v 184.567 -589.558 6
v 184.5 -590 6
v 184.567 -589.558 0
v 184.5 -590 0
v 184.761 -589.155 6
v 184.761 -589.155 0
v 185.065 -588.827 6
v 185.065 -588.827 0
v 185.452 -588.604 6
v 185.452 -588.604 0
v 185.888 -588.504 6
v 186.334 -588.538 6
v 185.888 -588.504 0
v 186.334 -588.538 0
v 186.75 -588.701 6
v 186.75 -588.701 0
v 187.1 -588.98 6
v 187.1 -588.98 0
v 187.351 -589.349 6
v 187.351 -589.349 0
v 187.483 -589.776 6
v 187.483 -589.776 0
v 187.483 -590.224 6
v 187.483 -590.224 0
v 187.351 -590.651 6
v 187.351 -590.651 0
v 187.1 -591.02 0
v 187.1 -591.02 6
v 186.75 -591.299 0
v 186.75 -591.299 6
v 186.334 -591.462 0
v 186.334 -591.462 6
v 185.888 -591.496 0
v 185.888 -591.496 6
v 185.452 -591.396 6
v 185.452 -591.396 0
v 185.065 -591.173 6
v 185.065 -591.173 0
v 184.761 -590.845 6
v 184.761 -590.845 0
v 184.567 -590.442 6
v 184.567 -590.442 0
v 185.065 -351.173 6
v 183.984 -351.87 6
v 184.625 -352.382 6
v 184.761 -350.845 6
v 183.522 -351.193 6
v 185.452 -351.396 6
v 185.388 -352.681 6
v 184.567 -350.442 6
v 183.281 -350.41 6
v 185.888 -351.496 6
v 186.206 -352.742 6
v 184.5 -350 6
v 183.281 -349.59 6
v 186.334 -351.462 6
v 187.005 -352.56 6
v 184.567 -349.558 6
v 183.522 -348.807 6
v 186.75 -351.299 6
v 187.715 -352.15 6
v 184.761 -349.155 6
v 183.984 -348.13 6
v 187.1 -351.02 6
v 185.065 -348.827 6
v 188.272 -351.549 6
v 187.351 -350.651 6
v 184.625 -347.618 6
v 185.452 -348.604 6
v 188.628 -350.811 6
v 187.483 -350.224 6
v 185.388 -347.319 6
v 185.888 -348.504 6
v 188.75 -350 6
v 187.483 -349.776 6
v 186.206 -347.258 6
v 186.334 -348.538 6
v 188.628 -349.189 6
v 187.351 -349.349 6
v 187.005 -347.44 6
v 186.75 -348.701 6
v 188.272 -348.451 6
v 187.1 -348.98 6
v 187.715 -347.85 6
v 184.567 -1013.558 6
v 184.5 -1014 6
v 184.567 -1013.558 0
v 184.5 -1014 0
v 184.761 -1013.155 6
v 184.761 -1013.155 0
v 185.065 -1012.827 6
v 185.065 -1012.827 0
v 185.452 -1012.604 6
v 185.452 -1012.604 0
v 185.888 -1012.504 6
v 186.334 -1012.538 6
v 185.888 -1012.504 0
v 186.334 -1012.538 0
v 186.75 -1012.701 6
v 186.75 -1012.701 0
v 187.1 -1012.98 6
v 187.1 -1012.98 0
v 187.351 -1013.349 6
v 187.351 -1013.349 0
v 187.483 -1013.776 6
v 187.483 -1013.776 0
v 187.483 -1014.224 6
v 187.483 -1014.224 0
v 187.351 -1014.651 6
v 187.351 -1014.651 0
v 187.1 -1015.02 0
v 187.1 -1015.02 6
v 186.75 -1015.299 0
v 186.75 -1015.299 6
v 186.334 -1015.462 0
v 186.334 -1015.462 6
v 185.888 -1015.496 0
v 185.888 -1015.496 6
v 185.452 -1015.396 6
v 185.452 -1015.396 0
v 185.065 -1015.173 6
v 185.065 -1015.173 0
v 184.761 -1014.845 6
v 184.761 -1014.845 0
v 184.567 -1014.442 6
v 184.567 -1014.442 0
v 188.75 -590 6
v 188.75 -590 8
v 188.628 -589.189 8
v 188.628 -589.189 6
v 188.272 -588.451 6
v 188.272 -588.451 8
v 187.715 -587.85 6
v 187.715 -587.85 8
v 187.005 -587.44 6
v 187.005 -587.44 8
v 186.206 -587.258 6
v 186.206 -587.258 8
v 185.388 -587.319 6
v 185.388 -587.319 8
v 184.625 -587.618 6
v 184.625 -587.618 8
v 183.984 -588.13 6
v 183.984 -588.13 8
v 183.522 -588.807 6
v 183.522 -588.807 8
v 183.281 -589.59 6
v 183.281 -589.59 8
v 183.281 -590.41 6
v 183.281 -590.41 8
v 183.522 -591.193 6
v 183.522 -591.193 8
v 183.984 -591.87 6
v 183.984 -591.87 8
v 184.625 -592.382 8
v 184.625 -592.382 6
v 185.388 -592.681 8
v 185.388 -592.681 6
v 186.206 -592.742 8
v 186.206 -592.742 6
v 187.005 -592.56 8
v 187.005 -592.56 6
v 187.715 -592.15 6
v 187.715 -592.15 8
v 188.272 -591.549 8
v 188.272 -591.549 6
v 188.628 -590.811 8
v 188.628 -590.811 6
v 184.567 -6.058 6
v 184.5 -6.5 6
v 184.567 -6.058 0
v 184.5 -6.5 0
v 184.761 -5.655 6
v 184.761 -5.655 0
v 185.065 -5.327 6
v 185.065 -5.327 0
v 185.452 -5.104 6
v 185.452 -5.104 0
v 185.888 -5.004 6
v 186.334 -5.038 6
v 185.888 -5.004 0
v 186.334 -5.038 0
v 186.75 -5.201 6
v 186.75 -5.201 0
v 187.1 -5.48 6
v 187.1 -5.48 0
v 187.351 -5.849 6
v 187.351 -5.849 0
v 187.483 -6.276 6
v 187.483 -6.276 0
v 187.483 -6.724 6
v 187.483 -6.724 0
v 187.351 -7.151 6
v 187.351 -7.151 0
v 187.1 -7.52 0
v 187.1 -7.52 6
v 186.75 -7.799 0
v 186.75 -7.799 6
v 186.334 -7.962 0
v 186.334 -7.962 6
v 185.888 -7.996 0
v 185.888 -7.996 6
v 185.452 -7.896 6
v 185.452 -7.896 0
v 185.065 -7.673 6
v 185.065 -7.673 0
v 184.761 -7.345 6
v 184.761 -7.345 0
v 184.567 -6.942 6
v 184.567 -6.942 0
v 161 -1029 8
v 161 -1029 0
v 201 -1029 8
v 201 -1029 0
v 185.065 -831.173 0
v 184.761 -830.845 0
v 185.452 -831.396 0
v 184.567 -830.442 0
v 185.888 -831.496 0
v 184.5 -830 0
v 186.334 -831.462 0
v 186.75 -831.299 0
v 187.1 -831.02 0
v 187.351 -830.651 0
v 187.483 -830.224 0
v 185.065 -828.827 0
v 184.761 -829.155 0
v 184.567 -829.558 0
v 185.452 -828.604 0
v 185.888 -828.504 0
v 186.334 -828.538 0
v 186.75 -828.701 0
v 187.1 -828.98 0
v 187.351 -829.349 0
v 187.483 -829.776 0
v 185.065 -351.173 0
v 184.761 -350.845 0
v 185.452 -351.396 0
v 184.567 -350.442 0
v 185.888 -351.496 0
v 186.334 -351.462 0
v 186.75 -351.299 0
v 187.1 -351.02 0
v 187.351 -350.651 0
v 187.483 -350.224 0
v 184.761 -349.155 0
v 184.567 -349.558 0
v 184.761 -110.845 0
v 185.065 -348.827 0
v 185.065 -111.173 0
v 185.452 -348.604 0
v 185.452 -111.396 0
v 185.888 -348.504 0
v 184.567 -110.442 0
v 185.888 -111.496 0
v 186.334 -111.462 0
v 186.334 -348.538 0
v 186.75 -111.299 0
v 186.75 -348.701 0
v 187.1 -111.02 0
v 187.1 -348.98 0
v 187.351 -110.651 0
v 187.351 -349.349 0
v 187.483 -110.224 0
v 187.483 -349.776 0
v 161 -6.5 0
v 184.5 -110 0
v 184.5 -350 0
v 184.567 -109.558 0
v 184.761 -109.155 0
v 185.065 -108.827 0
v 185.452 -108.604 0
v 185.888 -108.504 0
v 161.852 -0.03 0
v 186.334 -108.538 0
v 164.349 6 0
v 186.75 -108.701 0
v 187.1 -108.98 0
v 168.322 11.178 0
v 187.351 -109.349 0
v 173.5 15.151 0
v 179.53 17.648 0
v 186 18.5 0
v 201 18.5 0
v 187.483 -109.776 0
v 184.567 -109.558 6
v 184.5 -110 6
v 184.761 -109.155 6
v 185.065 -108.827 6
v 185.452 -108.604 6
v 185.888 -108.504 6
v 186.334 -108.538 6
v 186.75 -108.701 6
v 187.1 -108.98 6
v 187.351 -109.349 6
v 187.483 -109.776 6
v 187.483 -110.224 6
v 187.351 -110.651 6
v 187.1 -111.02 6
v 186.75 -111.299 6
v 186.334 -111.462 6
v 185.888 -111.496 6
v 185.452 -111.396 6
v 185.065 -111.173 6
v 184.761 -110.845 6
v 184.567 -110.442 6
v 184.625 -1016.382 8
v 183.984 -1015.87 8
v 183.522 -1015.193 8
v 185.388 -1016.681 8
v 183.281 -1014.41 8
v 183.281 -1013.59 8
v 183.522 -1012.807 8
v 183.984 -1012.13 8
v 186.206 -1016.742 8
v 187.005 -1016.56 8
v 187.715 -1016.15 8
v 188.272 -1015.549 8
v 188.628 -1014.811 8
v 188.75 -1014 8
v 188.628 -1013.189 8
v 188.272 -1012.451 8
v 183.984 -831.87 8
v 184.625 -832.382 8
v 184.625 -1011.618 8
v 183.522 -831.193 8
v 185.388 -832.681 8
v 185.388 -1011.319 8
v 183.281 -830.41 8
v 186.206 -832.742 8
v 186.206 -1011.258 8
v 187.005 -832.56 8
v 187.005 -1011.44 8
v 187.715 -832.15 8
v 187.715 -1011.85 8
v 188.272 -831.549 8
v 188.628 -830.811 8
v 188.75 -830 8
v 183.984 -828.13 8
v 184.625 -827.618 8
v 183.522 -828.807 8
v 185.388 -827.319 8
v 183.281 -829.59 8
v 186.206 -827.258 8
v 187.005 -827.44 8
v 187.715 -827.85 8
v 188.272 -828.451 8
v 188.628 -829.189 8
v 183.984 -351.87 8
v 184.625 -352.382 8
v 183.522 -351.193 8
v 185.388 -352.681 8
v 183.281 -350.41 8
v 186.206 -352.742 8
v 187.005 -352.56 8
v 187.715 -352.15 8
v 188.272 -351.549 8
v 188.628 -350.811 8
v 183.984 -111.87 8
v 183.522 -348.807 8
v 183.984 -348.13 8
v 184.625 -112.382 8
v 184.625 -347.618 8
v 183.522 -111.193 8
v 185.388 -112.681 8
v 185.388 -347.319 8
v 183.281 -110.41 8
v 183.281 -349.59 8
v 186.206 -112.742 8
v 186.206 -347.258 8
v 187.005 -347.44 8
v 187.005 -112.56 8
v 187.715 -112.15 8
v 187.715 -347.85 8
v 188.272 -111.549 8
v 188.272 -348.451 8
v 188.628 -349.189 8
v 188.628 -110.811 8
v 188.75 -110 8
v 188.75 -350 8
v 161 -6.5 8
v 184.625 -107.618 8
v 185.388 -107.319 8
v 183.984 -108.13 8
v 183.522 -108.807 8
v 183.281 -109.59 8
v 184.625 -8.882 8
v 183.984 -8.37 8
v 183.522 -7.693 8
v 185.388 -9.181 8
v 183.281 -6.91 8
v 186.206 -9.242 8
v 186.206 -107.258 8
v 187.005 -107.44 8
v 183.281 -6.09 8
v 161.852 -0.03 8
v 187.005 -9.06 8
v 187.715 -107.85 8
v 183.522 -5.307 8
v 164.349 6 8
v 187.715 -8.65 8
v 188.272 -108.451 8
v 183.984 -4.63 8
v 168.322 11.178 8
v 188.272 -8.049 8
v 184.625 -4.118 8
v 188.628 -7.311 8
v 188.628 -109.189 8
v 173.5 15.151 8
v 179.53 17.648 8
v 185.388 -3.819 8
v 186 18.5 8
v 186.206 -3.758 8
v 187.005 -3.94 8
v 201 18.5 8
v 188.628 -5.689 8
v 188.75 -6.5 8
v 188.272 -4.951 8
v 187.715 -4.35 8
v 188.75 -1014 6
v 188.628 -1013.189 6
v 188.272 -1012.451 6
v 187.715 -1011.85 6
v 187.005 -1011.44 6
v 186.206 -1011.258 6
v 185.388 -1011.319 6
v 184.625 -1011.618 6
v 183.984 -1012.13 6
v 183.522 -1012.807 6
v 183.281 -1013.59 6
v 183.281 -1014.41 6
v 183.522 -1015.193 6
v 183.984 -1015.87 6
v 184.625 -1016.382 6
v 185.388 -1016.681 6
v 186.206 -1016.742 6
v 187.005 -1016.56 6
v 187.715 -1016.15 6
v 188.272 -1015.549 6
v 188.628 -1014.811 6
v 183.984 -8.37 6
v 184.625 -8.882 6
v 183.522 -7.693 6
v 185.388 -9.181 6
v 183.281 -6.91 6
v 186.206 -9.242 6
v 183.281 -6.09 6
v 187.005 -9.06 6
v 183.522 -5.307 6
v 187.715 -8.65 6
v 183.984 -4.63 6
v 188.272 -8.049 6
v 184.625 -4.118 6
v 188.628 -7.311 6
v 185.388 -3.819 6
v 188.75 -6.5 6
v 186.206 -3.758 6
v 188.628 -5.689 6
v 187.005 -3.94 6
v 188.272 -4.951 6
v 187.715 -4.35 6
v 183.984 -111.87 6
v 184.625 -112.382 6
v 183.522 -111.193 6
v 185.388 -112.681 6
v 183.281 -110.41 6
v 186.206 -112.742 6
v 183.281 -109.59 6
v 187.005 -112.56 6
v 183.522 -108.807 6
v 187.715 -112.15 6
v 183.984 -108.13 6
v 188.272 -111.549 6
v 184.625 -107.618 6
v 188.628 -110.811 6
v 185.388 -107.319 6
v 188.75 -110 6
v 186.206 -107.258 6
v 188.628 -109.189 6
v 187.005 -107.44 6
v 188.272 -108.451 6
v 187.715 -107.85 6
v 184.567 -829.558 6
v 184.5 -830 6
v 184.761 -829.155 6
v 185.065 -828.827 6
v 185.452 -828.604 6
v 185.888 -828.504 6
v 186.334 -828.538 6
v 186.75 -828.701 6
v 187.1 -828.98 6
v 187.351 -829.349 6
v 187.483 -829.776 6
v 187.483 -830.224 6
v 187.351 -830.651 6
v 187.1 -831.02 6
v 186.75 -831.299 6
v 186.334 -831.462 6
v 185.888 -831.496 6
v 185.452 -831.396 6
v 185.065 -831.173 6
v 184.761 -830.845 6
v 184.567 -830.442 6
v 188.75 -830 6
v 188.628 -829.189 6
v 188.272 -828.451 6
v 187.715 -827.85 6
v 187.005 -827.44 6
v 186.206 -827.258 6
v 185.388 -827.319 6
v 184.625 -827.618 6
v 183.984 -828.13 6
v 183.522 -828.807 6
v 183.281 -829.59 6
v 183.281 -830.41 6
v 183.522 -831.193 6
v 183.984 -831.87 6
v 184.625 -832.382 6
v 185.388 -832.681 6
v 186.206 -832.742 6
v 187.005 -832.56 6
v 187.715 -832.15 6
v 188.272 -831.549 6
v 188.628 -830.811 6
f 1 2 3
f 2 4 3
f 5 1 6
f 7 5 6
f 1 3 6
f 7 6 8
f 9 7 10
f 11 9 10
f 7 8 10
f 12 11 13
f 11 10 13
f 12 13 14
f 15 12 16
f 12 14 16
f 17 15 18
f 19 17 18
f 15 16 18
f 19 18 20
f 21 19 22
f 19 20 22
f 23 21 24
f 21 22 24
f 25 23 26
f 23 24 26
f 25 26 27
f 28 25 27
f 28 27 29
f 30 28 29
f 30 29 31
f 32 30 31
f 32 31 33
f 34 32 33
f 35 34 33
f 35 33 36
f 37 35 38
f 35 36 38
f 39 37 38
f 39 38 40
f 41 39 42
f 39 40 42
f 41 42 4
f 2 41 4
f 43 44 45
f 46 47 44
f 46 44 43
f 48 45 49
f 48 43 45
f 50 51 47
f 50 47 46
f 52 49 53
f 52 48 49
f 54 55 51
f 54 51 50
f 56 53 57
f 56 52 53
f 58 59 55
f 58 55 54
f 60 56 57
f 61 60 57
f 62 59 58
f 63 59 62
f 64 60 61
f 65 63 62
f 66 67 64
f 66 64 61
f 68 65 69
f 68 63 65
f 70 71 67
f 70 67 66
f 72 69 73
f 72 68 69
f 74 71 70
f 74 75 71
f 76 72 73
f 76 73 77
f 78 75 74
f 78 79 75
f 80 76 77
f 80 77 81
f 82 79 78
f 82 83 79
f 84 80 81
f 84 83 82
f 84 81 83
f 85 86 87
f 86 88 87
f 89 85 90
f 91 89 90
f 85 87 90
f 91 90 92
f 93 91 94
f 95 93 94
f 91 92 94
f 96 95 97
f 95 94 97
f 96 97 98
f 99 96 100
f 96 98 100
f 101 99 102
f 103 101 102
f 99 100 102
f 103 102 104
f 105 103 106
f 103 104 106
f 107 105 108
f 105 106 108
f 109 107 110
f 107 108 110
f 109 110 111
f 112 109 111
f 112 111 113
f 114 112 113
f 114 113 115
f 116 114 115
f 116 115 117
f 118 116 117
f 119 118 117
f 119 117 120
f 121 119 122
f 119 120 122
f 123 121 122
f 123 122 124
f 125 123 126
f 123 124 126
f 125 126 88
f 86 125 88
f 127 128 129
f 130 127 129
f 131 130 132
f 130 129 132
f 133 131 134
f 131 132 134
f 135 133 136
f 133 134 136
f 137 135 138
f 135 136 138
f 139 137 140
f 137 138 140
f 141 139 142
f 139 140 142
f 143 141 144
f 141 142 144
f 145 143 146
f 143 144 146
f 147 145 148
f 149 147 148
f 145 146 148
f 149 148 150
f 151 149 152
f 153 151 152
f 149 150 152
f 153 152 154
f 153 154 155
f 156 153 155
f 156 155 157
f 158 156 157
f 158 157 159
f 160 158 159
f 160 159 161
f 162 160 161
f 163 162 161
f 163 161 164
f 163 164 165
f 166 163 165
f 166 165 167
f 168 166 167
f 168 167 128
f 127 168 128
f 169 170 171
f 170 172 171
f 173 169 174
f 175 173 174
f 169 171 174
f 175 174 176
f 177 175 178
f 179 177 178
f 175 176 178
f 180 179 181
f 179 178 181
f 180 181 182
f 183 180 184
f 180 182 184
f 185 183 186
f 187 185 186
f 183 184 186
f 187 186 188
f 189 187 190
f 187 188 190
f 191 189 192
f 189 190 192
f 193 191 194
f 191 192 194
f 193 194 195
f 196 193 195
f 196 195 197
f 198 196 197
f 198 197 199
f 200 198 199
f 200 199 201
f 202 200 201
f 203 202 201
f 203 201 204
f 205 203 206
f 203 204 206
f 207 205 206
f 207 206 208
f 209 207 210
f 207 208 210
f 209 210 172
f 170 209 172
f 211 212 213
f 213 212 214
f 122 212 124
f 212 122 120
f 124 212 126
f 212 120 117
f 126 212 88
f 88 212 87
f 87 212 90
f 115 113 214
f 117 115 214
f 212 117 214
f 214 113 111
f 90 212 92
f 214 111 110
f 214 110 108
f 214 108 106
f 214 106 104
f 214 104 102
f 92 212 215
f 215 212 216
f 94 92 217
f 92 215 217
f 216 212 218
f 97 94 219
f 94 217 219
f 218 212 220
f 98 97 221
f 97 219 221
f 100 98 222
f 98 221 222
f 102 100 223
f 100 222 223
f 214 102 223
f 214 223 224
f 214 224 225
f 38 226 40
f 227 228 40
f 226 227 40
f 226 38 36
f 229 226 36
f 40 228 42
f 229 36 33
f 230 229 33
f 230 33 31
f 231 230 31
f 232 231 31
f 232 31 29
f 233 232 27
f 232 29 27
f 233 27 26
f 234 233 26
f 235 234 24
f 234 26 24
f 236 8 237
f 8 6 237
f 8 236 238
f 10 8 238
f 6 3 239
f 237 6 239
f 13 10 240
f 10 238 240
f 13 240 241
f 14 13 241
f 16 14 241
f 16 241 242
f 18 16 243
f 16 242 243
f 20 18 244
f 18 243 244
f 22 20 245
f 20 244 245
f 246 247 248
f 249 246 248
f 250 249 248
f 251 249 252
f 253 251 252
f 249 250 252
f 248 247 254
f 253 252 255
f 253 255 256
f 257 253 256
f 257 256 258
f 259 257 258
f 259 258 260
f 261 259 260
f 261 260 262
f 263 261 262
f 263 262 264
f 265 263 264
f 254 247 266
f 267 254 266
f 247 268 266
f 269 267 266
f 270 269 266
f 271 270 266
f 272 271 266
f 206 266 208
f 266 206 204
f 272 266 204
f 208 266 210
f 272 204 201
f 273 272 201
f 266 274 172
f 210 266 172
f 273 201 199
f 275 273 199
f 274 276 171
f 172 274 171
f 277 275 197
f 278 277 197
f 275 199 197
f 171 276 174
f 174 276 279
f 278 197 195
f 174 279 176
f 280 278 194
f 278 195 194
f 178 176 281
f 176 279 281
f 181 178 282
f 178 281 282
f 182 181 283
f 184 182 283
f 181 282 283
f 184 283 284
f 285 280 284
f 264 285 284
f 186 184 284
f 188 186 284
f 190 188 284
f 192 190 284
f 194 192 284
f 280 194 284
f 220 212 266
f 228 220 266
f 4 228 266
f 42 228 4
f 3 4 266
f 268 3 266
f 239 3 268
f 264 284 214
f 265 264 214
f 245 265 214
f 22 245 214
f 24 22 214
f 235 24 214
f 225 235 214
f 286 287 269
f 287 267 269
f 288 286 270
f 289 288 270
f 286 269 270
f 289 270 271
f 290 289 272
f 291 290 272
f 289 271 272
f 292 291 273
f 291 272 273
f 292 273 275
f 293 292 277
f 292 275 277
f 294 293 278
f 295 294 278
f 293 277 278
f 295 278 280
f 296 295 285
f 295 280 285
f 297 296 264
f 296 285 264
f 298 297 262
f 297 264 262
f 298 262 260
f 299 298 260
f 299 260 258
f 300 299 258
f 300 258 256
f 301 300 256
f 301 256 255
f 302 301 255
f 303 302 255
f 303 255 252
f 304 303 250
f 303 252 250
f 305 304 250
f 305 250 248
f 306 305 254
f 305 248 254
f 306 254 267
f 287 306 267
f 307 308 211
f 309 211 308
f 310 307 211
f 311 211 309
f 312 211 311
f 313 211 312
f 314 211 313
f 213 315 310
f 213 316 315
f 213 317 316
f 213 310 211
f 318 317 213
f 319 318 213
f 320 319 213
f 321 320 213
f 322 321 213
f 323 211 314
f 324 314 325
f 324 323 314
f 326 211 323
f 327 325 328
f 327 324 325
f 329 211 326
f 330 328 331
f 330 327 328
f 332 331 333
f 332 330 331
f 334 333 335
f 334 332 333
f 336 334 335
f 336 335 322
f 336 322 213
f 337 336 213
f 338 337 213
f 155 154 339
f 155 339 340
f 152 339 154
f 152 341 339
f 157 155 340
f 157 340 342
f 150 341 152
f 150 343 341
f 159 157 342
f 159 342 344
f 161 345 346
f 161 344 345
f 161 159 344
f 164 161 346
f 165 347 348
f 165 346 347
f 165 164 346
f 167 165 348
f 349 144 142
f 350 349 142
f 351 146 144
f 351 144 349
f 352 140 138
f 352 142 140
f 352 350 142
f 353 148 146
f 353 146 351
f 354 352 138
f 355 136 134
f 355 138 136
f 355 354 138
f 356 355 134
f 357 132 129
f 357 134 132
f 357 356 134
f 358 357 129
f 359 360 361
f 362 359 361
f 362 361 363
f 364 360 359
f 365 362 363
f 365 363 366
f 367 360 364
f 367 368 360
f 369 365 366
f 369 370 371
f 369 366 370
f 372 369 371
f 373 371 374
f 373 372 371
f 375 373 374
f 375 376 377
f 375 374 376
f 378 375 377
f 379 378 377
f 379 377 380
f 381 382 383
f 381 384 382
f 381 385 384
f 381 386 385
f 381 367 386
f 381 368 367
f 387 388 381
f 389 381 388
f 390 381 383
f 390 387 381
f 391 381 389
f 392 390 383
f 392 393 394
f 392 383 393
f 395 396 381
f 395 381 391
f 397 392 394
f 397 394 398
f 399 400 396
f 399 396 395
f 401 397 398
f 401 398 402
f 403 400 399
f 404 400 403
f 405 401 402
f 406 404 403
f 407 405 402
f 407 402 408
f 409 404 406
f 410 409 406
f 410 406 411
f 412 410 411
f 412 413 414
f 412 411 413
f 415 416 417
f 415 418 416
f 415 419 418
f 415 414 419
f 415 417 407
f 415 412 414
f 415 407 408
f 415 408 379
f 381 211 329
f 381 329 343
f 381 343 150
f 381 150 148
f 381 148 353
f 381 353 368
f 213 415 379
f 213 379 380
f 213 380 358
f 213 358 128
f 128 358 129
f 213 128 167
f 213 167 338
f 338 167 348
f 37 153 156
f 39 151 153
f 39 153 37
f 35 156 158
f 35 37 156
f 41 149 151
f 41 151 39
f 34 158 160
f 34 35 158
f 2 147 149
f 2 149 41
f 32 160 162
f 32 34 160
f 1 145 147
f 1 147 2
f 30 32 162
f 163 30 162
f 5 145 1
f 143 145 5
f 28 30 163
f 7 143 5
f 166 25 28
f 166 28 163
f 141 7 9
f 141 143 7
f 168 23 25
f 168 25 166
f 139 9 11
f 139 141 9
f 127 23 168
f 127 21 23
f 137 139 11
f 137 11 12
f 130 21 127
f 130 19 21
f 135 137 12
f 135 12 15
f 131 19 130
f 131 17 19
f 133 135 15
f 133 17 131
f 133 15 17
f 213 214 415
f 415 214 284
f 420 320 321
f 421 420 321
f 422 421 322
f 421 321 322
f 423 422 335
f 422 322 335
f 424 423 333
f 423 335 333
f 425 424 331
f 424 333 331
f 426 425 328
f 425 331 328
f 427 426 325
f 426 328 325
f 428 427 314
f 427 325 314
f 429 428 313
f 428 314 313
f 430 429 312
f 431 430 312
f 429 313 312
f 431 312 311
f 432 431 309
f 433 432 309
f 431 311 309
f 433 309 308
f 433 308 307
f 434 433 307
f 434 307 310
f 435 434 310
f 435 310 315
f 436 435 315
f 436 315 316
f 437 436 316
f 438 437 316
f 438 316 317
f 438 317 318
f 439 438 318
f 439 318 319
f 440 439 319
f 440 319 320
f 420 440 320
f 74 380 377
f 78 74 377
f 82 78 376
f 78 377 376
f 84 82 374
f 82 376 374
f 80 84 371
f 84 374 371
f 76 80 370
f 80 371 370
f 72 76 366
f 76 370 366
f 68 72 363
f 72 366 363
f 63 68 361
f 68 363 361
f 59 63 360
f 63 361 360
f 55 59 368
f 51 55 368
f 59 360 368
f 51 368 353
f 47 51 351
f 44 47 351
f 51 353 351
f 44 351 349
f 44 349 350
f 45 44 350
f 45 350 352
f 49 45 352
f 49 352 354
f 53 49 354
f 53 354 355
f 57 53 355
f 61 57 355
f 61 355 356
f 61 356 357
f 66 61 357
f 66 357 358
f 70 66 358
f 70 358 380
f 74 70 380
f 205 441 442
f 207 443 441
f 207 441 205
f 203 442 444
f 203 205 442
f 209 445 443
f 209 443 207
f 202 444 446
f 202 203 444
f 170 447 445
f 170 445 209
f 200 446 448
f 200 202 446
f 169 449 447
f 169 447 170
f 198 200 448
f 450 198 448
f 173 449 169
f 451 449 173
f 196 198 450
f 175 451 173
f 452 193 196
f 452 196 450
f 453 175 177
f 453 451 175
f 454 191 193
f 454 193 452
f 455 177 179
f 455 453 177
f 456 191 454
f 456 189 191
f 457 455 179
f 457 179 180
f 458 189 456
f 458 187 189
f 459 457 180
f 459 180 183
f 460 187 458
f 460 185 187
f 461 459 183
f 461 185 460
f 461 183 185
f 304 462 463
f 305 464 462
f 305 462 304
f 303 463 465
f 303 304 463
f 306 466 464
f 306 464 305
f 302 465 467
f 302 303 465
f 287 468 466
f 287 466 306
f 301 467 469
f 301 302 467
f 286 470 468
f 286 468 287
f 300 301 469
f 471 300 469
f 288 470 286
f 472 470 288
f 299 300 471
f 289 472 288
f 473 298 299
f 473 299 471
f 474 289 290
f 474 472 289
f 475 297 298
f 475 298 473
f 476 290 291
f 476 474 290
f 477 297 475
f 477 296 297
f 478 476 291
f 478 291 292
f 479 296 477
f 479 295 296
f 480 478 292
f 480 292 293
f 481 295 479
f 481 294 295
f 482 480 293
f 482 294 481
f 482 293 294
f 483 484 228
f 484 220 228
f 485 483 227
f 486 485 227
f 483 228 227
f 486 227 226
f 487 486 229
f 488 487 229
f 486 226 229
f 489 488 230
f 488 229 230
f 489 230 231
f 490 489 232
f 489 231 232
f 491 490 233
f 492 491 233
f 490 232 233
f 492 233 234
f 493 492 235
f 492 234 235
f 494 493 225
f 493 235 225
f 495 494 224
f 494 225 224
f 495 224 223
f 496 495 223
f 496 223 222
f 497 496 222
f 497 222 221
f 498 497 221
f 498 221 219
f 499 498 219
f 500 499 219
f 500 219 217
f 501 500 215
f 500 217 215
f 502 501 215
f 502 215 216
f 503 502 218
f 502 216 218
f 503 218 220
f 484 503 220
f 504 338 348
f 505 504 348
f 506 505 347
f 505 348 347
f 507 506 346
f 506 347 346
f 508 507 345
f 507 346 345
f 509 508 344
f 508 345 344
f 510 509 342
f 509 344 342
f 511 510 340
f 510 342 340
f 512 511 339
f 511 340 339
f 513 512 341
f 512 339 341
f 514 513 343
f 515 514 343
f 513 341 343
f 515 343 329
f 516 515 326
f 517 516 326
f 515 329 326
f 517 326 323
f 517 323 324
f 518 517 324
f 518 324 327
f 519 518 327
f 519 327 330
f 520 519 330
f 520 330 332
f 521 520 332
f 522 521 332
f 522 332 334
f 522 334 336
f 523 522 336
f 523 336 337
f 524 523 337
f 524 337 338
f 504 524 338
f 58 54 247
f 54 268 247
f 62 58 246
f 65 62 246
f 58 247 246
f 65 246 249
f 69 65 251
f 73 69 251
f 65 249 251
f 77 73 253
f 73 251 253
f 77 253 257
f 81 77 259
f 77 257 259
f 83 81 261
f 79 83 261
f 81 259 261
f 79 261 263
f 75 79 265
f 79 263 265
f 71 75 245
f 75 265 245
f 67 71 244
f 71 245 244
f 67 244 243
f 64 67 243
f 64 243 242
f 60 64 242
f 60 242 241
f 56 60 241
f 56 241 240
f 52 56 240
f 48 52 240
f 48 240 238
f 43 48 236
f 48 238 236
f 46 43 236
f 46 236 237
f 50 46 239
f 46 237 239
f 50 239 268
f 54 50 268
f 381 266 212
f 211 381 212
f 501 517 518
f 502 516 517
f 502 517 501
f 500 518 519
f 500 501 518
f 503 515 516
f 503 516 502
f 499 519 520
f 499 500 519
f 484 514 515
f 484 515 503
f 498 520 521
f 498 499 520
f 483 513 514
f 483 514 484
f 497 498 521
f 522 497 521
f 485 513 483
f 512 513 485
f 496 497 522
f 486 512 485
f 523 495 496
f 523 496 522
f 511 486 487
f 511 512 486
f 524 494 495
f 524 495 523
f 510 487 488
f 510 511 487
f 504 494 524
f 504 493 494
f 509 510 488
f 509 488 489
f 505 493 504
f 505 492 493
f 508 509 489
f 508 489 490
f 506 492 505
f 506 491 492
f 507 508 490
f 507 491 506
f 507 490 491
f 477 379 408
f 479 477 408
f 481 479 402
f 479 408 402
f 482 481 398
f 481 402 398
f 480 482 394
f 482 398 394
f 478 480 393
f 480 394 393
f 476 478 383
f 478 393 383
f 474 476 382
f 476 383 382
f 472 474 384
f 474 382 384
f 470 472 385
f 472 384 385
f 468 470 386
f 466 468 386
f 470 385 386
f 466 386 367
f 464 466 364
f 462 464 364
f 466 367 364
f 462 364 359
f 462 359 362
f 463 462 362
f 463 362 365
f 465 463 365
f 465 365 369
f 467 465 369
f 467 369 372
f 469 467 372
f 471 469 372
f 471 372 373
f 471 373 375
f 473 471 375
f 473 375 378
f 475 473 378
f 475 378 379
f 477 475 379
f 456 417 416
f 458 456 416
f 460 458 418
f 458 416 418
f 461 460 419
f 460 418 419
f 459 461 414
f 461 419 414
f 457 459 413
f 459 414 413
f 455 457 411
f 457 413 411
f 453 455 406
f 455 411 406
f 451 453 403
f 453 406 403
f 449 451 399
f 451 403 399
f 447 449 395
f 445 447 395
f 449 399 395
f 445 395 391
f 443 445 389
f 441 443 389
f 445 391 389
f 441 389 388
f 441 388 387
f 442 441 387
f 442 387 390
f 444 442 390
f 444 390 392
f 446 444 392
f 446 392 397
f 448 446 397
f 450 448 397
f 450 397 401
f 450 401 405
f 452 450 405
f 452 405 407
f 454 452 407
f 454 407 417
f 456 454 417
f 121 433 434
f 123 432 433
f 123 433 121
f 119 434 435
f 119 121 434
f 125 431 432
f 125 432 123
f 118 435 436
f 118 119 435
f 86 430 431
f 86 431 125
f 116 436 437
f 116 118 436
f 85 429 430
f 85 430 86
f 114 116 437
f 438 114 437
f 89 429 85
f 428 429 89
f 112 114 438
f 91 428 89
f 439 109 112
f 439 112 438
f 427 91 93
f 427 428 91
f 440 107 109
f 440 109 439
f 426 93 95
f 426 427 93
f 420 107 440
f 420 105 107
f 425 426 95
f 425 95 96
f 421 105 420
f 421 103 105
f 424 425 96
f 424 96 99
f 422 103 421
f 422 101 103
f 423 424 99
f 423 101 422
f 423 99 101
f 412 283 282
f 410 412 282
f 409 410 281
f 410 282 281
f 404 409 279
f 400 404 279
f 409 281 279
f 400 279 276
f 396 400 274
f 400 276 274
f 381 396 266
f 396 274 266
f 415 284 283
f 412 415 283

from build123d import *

# Parameters (mm, degrees)
BOSS_EXTRU_1_DEPTH                                 = 8
CHAMBRAGE_POUR_VIS_T_TE_CYLINDRIQUE_CO_D           = 3
CHAMBRAGE_POUR_VIS_T_TE_CYLINDRIQUE_CO_CBORE_D     = 5.5
CHAMBRAGE_POUR_VIS_T_TE_CYLINDRIQUE_CO_CBORE_DEPTH = 2


with BuildPart() as part:
    # Esquisse1 → Boss.-Extru.1 (new body)
    with BuildSketch(Plane.XY):
        with BuildLine():
            Line((201, 18.5), (186, 18.5))
            ThreePointArc((186, 18.5), (168.32233047, 11.17766953), (161, -6.5))
            Line((161, -6.5), (161, -1029))
            Line((161, -1029), (201, -1029))
            Line((201, -1029), (201, 18.5))
        make_face()
    extrude(amount=BOSS_EXTRU_1_DEPTH)

    # Chambrage pour vis à tête cylindrique courte six pans creux M31 (through all)
    with Locations(Plane.XY.offset(8)):
        with Locations((186, -1014), (186, -830), (186, -590), (186, -350), (186, -110), (186, -6.5)):
            CounterBoreHole(CHAMBRAGE_POUR_VIS_T_TE_CYLINDRIQUE_CO_D / 2, CHAMBRAGE_POUR_VIS_T_TE_CYLINDRIQUE_CO_CBORE_D / 2, CHAMBRAGE_POUR_VIS_T_TE_CYLINDRIQUE_CO_CBORE_DEPTH)


solid = part.part
